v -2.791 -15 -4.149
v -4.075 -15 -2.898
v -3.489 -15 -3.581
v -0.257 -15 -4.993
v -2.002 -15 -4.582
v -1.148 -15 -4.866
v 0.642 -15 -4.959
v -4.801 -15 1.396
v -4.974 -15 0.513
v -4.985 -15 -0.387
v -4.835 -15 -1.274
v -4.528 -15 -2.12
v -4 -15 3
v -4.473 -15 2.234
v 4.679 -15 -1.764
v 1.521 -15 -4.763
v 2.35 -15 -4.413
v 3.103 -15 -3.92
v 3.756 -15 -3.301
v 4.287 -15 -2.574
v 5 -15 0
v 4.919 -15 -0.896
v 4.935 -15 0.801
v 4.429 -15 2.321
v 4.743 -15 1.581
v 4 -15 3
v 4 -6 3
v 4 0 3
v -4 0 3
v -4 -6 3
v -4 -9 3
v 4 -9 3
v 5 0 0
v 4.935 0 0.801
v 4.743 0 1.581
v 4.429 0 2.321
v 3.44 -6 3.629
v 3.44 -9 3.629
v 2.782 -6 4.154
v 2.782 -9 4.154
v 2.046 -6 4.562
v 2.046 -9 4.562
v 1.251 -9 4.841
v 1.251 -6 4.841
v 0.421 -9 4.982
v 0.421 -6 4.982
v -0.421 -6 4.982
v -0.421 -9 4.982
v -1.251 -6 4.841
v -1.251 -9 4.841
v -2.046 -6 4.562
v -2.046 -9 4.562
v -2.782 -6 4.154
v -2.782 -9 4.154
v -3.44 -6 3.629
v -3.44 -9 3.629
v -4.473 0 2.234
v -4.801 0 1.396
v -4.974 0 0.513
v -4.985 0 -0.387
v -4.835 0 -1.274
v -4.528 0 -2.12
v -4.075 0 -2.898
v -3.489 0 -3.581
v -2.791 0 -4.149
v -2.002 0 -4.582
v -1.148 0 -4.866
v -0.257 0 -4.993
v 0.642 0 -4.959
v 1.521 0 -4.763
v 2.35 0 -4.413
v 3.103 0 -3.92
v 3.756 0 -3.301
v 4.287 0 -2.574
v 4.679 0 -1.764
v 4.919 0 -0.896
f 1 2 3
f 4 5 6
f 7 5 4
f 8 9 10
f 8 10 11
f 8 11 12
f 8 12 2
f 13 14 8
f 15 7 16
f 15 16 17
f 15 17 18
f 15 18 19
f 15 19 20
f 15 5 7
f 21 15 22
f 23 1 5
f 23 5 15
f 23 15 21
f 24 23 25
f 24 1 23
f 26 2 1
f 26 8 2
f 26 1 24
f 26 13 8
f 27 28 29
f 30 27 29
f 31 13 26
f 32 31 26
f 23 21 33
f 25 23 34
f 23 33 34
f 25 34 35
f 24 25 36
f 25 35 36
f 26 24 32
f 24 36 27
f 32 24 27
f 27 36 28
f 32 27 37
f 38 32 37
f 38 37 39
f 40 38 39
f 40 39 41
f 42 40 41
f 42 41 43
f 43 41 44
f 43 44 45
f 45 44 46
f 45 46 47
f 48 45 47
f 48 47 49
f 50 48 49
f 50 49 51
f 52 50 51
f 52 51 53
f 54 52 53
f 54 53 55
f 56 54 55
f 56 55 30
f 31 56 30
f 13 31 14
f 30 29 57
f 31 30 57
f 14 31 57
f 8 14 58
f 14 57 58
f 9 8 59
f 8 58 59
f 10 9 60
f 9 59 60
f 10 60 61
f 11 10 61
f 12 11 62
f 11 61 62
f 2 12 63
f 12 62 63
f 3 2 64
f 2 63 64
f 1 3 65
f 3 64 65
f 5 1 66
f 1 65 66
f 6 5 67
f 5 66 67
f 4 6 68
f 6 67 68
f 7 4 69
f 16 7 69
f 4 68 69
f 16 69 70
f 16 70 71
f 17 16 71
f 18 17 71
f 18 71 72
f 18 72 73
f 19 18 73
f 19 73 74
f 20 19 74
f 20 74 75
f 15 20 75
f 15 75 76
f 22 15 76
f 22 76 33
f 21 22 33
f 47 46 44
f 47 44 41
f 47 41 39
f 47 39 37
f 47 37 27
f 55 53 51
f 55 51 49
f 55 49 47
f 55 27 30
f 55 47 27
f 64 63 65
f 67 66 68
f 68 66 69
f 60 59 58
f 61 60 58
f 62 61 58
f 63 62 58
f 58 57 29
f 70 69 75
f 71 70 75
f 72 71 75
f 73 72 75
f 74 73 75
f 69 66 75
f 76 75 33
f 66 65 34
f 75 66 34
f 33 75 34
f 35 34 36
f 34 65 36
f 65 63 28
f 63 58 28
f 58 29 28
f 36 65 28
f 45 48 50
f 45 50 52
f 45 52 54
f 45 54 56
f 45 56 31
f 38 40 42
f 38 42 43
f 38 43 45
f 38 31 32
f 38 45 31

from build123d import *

# Parameters (mm, degrees)
F0_R     = 5
F1_DEPTH = 15
F3_DEPTH = 6
F5_DEPTH = 6


with BuildPart() as f1:
    # F0 (on Front) → F1 (new body)
    with BuildSketch(Plane.XZ):
        Circle(F0_R)
    extrude(amount=F1_DEPTH)

    # F2 (on face) → F3 (cut)
    with BuildSketch(Plane.XZ.offset(15)):
        with BuildLine():
            ThreePointArc((4, 3), (0, 5), (-4, 3))
            Line((-4, 3), (4, 3))
        make_face()
    extrude(amount=-F3_DEPTH, mode=Mode.SUBTRACT)

    # F4 (on face) → F5 (cut)
    with BuildSketch(Plane(origin=(0, 0, 0), x_dir=(-1, 0, 0), z_dir=(0, 1, 0))):
        with BuildLine():
            ThreePointArc((4, 3), (0, 5), (-4, 3))
            Line((-4, 3), (4, 3))
        make_face()
    extrude(amount=-F5_DEPTH, mode=Mode.SUBTRACT)


solid = f1.part
